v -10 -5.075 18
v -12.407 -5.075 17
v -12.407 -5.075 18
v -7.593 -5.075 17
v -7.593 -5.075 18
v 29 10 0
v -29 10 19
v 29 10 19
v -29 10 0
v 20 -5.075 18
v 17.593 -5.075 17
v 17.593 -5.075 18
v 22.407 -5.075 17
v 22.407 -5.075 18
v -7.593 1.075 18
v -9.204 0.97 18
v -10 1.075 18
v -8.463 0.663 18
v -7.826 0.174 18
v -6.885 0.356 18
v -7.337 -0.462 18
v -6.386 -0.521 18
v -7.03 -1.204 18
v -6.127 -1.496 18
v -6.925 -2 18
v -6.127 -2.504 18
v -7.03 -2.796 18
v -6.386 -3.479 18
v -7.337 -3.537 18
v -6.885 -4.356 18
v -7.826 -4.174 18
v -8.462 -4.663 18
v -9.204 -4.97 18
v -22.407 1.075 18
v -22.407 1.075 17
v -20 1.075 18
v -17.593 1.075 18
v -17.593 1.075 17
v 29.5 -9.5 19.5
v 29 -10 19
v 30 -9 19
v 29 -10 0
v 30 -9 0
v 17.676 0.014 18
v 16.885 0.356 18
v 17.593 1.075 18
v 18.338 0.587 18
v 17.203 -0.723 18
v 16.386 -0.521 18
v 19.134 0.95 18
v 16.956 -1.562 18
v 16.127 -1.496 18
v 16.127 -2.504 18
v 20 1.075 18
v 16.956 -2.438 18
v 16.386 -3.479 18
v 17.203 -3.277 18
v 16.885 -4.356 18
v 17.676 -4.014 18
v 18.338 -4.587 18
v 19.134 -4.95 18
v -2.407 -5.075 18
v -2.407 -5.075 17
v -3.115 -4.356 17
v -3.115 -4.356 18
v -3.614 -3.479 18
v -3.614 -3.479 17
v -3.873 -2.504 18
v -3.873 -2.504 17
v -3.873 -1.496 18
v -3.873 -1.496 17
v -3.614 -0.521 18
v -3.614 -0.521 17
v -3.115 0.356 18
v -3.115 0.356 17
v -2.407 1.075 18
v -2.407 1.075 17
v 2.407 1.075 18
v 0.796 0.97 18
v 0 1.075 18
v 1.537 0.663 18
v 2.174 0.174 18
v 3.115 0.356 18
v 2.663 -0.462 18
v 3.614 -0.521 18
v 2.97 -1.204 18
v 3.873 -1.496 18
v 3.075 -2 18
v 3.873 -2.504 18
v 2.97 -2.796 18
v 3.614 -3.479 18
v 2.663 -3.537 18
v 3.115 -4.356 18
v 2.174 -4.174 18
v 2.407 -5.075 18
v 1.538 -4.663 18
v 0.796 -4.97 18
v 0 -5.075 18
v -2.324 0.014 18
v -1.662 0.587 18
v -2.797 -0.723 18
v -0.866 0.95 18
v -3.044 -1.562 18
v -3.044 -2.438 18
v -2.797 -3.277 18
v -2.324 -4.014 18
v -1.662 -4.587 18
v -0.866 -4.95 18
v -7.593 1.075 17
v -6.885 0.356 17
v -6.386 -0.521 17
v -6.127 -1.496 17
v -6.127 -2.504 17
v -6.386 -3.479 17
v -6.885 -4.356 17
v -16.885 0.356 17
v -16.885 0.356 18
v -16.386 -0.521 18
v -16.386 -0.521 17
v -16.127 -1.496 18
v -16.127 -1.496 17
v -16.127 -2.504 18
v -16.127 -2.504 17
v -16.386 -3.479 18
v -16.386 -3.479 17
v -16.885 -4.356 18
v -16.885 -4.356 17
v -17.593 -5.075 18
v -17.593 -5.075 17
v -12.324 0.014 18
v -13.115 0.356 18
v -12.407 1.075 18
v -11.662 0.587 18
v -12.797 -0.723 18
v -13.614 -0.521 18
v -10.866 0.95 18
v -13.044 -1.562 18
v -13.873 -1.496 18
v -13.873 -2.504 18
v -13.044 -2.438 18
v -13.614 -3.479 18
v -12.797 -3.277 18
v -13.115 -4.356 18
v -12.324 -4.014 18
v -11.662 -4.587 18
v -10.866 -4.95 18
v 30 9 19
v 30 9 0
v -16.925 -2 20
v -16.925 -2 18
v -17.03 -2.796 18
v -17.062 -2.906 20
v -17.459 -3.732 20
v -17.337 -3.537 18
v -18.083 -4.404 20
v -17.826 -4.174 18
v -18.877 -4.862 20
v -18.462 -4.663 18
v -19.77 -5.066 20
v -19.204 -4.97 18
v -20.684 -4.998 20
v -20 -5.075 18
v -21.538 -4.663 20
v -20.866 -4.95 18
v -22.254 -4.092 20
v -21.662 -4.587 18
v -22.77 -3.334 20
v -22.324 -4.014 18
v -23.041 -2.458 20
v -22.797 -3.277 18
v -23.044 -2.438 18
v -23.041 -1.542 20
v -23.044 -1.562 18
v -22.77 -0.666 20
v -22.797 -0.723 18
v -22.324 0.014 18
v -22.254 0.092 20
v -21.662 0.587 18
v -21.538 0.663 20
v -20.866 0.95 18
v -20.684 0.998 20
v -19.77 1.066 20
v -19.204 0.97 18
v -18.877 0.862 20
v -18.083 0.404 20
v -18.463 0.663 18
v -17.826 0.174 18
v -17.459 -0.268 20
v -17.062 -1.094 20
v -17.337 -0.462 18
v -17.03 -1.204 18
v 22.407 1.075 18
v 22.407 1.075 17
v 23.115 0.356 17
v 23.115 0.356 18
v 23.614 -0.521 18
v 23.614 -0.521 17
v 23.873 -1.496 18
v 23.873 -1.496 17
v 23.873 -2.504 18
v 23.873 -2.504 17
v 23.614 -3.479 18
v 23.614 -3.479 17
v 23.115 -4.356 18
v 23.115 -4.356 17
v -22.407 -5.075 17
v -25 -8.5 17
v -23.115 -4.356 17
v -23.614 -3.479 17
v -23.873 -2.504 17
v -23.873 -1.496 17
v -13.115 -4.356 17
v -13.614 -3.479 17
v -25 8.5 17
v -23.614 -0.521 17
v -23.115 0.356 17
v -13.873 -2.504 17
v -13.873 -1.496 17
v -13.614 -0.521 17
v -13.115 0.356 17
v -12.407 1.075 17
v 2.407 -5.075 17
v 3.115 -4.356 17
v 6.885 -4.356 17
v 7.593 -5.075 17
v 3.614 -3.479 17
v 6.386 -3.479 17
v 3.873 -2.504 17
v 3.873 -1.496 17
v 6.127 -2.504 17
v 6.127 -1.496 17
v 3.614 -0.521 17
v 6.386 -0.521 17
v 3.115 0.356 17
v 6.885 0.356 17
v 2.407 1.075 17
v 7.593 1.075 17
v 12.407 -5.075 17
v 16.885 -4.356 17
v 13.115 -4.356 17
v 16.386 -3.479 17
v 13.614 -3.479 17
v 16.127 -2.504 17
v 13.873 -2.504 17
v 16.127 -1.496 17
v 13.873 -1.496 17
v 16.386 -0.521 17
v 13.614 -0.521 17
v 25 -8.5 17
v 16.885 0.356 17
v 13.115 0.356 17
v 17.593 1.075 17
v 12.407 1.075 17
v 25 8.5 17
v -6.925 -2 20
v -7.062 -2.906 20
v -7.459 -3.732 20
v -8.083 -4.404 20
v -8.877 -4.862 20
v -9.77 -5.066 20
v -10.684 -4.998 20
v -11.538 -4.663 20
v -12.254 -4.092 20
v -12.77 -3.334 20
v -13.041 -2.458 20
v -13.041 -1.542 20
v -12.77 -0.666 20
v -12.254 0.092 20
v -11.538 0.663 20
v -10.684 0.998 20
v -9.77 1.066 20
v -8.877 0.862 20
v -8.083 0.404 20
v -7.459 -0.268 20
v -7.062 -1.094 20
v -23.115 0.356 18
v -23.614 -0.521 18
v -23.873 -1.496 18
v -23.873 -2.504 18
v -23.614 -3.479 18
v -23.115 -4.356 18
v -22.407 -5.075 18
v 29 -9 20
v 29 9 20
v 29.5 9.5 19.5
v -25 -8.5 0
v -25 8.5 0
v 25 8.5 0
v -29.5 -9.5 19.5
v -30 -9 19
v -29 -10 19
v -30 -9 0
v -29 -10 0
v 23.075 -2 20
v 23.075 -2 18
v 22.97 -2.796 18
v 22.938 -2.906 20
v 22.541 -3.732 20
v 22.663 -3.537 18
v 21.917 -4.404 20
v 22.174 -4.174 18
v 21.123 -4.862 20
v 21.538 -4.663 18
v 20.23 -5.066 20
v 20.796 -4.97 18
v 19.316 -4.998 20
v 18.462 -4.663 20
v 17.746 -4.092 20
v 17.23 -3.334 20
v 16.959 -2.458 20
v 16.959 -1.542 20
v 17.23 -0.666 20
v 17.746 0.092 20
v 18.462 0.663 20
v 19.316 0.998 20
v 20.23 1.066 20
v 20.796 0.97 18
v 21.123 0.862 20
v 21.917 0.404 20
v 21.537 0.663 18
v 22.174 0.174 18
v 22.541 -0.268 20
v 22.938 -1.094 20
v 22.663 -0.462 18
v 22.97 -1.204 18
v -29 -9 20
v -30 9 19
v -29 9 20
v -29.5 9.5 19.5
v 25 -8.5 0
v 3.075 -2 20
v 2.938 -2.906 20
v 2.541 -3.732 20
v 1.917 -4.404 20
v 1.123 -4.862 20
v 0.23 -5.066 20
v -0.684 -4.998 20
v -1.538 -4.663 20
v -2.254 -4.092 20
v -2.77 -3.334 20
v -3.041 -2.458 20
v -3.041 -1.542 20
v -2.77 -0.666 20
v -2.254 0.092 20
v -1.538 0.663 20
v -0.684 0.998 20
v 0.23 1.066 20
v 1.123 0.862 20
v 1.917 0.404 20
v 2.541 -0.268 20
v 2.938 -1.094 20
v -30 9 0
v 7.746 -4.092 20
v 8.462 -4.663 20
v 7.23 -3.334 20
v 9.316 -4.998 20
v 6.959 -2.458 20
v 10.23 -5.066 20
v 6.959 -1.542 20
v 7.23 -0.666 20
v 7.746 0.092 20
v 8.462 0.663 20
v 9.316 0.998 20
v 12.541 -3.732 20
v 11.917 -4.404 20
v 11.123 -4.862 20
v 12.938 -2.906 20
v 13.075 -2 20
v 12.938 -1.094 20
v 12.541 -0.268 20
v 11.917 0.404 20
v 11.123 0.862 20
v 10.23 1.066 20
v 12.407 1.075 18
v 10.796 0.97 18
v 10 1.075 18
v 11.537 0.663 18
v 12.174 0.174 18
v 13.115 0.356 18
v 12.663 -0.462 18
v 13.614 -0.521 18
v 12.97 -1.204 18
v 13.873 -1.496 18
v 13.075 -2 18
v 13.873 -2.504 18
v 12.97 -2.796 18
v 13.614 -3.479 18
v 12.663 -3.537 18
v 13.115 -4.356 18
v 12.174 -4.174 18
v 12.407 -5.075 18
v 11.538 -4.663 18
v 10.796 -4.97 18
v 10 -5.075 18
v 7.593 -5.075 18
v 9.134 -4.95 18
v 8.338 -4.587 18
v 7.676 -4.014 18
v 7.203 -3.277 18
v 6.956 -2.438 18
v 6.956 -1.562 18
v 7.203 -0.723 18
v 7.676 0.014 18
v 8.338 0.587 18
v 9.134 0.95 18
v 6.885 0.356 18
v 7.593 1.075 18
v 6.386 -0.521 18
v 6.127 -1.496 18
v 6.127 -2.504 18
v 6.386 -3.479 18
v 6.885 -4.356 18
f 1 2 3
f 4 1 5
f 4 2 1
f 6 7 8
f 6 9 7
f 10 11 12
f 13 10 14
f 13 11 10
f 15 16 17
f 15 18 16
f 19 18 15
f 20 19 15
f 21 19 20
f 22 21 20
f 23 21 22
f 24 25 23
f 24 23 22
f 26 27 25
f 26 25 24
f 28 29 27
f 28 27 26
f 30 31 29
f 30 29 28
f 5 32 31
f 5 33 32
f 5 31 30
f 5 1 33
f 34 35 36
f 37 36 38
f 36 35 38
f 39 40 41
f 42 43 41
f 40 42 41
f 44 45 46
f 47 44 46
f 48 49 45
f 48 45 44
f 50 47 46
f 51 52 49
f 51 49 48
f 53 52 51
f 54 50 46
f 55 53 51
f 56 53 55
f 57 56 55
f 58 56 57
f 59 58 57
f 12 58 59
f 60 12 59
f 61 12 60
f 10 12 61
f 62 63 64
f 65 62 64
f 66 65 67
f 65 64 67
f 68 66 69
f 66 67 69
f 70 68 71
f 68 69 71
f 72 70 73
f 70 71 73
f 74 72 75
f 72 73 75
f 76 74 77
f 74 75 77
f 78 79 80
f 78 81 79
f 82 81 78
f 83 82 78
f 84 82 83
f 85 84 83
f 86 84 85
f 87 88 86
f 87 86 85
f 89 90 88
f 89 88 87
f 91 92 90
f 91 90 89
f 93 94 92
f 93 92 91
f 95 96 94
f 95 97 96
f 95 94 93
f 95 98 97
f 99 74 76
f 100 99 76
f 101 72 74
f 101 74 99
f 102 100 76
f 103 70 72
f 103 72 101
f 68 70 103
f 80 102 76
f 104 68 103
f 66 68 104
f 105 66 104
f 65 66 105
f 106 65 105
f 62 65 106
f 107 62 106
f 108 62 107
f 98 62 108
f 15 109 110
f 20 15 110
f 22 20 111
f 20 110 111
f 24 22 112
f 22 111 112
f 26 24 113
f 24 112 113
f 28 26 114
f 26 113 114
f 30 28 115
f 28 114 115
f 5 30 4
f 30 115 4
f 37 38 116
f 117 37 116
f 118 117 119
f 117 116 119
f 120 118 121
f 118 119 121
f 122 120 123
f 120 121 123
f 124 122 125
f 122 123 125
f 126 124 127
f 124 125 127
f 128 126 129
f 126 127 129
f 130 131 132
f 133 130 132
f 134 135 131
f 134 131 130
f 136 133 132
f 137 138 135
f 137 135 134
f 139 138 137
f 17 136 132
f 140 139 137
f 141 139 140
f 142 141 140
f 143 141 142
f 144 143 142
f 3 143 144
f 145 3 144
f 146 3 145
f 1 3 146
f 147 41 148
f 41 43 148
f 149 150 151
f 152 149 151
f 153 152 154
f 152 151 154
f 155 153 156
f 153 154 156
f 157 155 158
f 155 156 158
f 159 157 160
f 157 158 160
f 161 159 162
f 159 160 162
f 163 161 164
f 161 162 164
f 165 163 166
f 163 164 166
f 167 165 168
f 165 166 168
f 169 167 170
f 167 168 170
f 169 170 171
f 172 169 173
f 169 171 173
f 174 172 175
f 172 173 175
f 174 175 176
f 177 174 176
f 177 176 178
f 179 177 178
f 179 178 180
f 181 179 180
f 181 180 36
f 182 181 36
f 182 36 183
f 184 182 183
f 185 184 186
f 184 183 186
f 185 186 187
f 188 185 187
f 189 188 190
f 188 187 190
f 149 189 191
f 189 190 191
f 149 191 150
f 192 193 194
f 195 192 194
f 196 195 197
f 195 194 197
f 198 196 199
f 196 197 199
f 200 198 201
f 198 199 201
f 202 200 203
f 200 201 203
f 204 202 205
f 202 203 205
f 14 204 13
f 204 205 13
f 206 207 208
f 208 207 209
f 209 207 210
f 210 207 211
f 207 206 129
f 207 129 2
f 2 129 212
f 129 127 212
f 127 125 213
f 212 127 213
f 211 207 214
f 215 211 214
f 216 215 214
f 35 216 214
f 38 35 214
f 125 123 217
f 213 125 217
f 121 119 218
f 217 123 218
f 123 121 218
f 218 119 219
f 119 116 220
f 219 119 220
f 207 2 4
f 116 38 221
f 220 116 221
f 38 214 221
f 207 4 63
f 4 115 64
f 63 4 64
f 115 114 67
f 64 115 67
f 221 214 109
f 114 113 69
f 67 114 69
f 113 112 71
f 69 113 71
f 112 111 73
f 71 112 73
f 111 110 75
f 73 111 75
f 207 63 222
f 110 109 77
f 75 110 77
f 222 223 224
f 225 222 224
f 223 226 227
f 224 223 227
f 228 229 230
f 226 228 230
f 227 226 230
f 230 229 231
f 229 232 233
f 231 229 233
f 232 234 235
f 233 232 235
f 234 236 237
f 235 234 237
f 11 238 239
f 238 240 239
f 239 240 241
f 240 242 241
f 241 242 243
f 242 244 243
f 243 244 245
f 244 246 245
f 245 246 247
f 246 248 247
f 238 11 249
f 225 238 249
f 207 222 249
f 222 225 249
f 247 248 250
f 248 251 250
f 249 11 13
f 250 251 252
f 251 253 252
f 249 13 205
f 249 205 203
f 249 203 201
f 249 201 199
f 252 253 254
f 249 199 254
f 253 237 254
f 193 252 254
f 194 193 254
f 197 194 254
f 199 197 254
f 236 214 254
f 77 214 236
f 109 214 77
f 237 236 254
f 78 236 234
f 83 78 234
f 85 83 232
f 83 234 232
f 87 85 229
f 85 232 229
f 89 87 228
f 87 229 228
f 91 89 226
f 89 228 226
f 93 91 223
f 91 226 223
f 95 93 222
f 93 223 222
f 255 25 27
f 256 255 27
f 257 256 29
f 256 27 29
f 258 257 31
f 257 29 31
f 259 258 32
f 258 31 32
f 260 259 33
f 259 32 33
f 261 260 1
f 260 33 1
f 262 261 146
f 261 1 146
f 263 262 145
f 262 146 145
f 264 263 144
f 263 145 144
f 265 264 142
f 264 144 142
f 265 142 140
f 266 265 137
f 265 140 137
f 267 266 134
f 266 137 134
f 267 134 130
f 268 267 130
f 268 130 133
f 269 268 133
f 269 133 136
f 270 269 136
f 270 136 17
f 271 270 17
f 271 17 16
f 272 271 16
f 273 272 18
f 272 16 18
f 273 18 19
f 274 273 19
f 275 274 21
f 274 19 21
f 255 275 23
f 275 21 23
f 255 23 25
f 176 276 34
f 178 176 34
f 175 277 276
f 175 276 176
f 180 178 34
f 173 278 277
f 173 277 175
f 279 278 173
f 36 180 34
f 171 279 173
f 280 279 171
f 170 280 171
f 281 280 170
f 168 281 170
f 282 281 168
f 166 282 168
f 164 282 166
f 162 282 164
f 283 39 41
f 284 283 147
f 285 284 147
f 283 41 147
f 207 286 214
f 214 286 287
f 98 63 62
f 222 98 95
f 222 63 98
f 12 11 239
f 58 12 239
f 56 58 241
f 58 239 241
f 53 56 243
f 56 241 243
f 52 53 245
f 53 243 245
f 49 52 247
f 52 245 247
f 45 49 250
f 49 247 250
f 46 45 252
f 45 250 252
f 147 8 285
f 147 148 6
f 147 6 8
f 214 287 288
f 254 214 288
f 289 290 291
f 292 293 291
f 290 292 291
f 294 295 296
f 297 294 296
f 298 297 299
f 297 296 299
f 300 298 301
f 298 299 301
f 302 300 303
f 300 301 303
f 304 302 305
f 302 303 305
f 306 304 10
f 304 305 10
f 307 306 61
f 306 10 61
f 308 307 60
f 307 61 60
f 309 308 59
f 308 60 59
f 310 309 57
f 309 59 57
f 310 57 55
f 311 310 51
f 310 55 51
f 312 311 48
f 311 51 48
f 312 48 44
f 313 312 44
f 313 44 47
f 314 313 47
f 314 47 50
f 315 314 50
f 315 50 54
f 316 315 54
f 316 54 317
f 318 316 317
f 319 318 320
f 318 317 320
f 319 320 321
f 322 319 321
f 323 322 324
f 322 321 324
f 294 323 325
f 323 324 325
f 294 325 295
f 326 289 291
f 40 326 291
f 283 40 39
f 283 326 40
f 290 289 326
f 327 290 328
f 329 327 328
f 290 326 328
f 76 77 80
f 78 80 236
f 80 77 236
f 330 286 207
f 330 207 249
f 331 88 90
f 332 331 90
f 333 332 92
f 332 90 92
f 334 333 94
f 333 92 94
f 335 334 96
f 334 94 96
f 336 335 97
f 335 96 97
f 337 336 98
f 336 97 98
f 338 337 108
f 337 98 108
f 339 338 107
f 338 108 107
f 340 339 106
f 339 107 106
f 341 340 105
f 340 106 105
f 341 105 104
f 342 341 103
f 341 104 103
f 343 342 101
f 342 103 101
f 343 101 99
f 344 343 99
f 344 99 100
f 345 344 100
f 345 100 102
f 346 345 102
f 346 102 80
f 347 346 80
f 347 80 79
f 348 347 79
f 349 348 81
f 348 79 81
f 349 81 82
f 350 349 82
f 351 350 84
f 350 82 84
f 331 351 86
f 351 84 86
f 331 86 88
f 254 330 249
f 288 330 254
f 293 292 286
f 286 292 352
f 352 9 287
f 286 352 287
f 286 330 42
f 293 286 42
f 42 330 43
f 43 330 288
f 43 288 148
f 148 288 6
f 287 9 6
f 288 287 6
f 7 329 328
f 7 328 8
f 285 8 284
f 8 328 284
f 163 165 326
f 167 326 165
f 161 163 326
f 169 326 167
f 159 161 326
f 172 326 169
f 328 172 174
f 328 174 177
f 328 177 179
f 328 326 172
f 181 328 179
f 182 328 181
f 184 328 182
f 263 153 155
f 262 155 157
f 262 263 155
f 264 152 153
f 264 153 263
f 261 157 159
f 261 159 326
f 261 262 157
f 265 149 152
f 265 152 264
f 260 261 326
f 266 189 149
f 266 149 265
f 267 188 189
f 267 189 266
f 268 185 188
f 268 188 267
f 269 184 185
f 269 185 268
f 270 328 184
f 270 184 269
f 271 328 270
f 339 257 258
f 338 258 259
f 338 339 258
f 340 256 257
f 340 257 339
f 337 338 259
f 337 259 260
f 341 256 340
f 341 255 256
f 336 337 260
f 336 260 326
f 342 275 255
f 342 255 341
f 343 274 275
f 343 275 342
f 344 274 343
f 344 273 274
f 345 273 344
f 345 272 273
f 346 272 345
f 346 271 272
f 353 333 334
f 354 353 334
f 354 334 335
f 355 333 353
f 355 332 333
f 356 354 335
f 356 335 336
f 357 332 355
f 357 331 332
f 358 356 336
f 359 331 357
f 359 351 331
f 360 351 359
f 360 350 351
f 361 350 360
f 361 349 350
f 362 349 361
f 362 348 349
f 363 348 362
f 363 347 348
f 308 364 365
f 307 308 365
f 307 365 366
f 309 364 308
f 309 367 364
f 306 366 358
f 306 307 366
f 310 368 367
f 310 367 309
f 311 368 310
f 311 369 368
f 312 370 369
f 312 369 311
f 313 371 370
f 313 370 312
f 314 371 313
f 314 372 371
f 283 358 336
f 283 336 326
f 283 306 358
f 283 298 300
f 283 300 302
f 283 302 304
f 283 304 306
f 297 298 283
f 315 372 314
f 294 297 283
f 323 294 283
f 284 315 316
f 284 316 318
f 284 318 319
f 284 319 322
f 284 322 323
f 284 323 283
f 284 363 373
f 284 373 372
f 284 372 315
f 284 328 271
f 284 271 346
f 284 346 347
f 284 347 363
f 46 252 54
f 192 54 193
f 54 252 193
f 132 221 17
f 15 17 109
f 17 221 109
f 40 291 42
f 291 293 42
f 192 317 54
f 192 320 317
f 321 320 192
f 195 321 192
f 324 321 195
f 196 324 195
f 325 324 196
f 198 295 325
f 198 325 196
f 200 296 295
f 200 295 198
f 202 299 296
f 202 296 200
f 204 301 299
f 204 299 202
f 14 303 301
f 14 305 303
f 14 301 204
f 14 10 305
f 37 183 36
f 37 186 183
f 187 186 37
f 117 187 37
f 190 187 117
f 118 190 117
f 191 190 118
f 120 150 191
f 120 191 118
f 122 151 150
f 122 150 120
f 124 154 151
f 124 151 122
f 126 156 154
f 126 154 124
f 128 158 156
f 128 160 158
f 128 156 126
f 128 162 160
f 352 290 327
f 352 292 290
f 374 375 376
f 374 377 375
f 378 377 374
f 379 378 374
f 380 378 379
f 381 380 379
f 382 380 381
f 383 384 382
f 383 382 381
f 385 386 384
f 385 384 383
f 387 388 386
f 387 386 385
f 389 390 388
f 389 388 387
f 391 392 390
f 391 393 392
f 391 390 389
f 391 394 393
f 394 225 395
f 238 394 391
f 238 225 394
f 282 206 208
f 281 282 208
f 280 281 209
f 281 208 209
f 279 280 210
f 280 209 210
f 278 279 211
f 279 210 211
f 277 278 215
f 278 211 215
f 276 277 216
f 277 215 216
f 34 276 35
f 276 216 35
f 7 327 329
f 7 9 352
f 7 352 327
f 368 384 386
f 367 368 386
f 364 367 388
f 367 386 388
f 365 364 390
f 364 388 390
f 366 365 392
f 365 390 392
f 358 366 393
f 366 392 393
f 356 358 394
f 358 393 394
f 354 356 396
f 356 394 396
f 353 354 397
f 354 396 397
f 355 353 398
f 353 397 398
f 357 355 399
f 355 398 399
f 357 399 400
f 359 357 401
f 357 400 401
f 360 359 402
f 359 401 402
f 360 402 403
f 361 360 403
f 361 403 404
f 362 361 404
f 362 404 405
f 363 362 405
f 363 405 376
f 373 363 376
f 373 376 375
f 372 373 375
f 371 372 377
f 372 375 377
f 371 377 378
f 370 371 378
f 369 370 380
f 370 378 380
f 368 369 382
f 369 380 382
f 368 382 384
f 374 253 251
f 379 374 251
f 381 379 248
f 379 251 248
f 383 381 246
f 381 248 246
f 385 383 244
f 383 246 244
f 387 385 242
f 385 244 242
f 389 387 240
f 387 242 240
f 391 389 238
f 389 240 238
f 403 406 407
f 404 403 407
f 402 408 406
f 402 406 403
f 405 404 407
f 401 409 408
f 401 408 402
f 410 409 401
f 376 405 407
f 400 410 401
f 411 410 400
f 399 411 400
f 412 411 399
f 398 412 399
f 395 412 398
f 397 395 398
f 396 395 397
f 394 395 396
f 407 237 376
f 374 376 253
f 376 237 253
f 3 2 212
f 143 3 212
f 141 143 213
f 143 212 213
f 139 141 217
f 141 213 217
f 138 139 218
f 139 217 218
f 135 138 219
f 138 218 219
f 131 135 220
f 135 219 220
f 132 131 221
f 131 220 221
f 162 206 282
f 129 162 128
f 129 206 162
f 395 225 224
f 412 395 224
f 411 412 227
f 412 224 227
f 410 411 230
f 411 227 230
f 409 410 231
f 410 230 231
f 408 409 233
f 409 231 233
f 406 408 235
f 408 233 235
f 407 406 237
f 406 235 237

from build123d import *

# Parameters (mm, degrees)
SKETCH001_W            = 60
SKETCH001_H            = 20
PAD_DEPTH              = 20
SKETCH002_W            = 50
SKETCH002_H            = 17
POCKET_DEPTH           = 17
POCKET001_DEPTH        = 1
LINEARPATTERN_COUNT    = 5
LINEARPATTERN_PITCH    = 10
SKETCH004_R            = 3.075
POCKET002_DEPTH        = 2.001
LINEARPATTERN001_COUNT = 5
LINEARPATTERN001_PITCH = 10
CHAMFER_SIZE           = 1
CHAMFER001_SIZE        = 1


with BuildPart() as part:
    # Sketch001 → Pad (new body)
    with BuildSketch(Plane.XY):
        Rectangle(SKETCH001_W, SKETCH001_H)
    extrude(amount=PAD_DEPTH)

    # Sketch002 → Pocket (cut)
    with BuildSketch(Plane.XY):
        Rectangle(SKETCH002_W, SKETCH002_H)
    extrude(amount=POCKET_DEPTH, mode=Mode.SUBTRACT)

    # Sketch003 (on Face11 of Pocket) → Pocket001 (cut)
    with BuildSketch(Plane(origin=(0, 0, 17), x_dir=(1, 0, 0), z_dir=(0, 0, -1))):
        with BuildLine():
            ThreePointArc((-22.407381, 5.075), (-23.905267, 2), (-22.407381, -1.075))
            Line((-22.407381, -1.075), (-17.592619, -1.075))
            ThreePointArc((-17.592619, -1.075), (-16.094733, 2), (-17.592619, 5.075))
            Line((-22.407381, 5.075), (-17.592619, 5.075))
        make_face()
    pocket001 = extrude(amount=-POCKET001_DEPTH, mode=Mode.SUBTRACT)

    # LinearPattern: Pocket001 ×5
    with Locations(*[(i * LINEARPATTERN_PITCH, 0, 0) for i in range(1, LINEARPATTERN_COUNT)]):
        add(pocket001, mode=Mode.SUBTRACT)

    # Sketch004 (on Face16 of Pocket001) → Pocket002 (cut, through all)
    with BuildSketch(Plane(origin=(0, 0, 18), x_dir=(1, 0, 0), z_dir=(0, 0, -1))):
        with Locations((-20, 2)):
            Circle(SKETCH004_R)
    pocket002 = extrude(amount=-POCKET002_DEPTH, mode=Mode.SUBTRACT)

    # LinearPattern001: Pocket002 ×5
    with Locations(*[(i * LINEARPATTERN001_PITCH, 0, 0) for i in range(1, LINEARPATTERN001_COUNT)]):
        add(pocket002, mode=Mode.SUBTRACT)

    # Chamfer
    chamfer_edges = [part.edges().sort_by_distance(p)[0] for p in [
        (0, 10, 20),
        (-30, 0, 20),
        (0, -10, 20),
        (30, 0, 20),
    ]]
    chamfer(chamfer_edges, length=CHAMFER_SIZE)

    # Chamfer001
    chamfer001_edges = [part.edges().sort_by_distance(p)[0] for p in [
        (-30, -10, 9.5),
        (-30, 10, 9.5),
        (30, -10, 9.5),
        (30, 10, 9.5),
    ]]
    chamfer(chamfer001_edges, length=CHAMFER001_SIZE)


solid = part.part
